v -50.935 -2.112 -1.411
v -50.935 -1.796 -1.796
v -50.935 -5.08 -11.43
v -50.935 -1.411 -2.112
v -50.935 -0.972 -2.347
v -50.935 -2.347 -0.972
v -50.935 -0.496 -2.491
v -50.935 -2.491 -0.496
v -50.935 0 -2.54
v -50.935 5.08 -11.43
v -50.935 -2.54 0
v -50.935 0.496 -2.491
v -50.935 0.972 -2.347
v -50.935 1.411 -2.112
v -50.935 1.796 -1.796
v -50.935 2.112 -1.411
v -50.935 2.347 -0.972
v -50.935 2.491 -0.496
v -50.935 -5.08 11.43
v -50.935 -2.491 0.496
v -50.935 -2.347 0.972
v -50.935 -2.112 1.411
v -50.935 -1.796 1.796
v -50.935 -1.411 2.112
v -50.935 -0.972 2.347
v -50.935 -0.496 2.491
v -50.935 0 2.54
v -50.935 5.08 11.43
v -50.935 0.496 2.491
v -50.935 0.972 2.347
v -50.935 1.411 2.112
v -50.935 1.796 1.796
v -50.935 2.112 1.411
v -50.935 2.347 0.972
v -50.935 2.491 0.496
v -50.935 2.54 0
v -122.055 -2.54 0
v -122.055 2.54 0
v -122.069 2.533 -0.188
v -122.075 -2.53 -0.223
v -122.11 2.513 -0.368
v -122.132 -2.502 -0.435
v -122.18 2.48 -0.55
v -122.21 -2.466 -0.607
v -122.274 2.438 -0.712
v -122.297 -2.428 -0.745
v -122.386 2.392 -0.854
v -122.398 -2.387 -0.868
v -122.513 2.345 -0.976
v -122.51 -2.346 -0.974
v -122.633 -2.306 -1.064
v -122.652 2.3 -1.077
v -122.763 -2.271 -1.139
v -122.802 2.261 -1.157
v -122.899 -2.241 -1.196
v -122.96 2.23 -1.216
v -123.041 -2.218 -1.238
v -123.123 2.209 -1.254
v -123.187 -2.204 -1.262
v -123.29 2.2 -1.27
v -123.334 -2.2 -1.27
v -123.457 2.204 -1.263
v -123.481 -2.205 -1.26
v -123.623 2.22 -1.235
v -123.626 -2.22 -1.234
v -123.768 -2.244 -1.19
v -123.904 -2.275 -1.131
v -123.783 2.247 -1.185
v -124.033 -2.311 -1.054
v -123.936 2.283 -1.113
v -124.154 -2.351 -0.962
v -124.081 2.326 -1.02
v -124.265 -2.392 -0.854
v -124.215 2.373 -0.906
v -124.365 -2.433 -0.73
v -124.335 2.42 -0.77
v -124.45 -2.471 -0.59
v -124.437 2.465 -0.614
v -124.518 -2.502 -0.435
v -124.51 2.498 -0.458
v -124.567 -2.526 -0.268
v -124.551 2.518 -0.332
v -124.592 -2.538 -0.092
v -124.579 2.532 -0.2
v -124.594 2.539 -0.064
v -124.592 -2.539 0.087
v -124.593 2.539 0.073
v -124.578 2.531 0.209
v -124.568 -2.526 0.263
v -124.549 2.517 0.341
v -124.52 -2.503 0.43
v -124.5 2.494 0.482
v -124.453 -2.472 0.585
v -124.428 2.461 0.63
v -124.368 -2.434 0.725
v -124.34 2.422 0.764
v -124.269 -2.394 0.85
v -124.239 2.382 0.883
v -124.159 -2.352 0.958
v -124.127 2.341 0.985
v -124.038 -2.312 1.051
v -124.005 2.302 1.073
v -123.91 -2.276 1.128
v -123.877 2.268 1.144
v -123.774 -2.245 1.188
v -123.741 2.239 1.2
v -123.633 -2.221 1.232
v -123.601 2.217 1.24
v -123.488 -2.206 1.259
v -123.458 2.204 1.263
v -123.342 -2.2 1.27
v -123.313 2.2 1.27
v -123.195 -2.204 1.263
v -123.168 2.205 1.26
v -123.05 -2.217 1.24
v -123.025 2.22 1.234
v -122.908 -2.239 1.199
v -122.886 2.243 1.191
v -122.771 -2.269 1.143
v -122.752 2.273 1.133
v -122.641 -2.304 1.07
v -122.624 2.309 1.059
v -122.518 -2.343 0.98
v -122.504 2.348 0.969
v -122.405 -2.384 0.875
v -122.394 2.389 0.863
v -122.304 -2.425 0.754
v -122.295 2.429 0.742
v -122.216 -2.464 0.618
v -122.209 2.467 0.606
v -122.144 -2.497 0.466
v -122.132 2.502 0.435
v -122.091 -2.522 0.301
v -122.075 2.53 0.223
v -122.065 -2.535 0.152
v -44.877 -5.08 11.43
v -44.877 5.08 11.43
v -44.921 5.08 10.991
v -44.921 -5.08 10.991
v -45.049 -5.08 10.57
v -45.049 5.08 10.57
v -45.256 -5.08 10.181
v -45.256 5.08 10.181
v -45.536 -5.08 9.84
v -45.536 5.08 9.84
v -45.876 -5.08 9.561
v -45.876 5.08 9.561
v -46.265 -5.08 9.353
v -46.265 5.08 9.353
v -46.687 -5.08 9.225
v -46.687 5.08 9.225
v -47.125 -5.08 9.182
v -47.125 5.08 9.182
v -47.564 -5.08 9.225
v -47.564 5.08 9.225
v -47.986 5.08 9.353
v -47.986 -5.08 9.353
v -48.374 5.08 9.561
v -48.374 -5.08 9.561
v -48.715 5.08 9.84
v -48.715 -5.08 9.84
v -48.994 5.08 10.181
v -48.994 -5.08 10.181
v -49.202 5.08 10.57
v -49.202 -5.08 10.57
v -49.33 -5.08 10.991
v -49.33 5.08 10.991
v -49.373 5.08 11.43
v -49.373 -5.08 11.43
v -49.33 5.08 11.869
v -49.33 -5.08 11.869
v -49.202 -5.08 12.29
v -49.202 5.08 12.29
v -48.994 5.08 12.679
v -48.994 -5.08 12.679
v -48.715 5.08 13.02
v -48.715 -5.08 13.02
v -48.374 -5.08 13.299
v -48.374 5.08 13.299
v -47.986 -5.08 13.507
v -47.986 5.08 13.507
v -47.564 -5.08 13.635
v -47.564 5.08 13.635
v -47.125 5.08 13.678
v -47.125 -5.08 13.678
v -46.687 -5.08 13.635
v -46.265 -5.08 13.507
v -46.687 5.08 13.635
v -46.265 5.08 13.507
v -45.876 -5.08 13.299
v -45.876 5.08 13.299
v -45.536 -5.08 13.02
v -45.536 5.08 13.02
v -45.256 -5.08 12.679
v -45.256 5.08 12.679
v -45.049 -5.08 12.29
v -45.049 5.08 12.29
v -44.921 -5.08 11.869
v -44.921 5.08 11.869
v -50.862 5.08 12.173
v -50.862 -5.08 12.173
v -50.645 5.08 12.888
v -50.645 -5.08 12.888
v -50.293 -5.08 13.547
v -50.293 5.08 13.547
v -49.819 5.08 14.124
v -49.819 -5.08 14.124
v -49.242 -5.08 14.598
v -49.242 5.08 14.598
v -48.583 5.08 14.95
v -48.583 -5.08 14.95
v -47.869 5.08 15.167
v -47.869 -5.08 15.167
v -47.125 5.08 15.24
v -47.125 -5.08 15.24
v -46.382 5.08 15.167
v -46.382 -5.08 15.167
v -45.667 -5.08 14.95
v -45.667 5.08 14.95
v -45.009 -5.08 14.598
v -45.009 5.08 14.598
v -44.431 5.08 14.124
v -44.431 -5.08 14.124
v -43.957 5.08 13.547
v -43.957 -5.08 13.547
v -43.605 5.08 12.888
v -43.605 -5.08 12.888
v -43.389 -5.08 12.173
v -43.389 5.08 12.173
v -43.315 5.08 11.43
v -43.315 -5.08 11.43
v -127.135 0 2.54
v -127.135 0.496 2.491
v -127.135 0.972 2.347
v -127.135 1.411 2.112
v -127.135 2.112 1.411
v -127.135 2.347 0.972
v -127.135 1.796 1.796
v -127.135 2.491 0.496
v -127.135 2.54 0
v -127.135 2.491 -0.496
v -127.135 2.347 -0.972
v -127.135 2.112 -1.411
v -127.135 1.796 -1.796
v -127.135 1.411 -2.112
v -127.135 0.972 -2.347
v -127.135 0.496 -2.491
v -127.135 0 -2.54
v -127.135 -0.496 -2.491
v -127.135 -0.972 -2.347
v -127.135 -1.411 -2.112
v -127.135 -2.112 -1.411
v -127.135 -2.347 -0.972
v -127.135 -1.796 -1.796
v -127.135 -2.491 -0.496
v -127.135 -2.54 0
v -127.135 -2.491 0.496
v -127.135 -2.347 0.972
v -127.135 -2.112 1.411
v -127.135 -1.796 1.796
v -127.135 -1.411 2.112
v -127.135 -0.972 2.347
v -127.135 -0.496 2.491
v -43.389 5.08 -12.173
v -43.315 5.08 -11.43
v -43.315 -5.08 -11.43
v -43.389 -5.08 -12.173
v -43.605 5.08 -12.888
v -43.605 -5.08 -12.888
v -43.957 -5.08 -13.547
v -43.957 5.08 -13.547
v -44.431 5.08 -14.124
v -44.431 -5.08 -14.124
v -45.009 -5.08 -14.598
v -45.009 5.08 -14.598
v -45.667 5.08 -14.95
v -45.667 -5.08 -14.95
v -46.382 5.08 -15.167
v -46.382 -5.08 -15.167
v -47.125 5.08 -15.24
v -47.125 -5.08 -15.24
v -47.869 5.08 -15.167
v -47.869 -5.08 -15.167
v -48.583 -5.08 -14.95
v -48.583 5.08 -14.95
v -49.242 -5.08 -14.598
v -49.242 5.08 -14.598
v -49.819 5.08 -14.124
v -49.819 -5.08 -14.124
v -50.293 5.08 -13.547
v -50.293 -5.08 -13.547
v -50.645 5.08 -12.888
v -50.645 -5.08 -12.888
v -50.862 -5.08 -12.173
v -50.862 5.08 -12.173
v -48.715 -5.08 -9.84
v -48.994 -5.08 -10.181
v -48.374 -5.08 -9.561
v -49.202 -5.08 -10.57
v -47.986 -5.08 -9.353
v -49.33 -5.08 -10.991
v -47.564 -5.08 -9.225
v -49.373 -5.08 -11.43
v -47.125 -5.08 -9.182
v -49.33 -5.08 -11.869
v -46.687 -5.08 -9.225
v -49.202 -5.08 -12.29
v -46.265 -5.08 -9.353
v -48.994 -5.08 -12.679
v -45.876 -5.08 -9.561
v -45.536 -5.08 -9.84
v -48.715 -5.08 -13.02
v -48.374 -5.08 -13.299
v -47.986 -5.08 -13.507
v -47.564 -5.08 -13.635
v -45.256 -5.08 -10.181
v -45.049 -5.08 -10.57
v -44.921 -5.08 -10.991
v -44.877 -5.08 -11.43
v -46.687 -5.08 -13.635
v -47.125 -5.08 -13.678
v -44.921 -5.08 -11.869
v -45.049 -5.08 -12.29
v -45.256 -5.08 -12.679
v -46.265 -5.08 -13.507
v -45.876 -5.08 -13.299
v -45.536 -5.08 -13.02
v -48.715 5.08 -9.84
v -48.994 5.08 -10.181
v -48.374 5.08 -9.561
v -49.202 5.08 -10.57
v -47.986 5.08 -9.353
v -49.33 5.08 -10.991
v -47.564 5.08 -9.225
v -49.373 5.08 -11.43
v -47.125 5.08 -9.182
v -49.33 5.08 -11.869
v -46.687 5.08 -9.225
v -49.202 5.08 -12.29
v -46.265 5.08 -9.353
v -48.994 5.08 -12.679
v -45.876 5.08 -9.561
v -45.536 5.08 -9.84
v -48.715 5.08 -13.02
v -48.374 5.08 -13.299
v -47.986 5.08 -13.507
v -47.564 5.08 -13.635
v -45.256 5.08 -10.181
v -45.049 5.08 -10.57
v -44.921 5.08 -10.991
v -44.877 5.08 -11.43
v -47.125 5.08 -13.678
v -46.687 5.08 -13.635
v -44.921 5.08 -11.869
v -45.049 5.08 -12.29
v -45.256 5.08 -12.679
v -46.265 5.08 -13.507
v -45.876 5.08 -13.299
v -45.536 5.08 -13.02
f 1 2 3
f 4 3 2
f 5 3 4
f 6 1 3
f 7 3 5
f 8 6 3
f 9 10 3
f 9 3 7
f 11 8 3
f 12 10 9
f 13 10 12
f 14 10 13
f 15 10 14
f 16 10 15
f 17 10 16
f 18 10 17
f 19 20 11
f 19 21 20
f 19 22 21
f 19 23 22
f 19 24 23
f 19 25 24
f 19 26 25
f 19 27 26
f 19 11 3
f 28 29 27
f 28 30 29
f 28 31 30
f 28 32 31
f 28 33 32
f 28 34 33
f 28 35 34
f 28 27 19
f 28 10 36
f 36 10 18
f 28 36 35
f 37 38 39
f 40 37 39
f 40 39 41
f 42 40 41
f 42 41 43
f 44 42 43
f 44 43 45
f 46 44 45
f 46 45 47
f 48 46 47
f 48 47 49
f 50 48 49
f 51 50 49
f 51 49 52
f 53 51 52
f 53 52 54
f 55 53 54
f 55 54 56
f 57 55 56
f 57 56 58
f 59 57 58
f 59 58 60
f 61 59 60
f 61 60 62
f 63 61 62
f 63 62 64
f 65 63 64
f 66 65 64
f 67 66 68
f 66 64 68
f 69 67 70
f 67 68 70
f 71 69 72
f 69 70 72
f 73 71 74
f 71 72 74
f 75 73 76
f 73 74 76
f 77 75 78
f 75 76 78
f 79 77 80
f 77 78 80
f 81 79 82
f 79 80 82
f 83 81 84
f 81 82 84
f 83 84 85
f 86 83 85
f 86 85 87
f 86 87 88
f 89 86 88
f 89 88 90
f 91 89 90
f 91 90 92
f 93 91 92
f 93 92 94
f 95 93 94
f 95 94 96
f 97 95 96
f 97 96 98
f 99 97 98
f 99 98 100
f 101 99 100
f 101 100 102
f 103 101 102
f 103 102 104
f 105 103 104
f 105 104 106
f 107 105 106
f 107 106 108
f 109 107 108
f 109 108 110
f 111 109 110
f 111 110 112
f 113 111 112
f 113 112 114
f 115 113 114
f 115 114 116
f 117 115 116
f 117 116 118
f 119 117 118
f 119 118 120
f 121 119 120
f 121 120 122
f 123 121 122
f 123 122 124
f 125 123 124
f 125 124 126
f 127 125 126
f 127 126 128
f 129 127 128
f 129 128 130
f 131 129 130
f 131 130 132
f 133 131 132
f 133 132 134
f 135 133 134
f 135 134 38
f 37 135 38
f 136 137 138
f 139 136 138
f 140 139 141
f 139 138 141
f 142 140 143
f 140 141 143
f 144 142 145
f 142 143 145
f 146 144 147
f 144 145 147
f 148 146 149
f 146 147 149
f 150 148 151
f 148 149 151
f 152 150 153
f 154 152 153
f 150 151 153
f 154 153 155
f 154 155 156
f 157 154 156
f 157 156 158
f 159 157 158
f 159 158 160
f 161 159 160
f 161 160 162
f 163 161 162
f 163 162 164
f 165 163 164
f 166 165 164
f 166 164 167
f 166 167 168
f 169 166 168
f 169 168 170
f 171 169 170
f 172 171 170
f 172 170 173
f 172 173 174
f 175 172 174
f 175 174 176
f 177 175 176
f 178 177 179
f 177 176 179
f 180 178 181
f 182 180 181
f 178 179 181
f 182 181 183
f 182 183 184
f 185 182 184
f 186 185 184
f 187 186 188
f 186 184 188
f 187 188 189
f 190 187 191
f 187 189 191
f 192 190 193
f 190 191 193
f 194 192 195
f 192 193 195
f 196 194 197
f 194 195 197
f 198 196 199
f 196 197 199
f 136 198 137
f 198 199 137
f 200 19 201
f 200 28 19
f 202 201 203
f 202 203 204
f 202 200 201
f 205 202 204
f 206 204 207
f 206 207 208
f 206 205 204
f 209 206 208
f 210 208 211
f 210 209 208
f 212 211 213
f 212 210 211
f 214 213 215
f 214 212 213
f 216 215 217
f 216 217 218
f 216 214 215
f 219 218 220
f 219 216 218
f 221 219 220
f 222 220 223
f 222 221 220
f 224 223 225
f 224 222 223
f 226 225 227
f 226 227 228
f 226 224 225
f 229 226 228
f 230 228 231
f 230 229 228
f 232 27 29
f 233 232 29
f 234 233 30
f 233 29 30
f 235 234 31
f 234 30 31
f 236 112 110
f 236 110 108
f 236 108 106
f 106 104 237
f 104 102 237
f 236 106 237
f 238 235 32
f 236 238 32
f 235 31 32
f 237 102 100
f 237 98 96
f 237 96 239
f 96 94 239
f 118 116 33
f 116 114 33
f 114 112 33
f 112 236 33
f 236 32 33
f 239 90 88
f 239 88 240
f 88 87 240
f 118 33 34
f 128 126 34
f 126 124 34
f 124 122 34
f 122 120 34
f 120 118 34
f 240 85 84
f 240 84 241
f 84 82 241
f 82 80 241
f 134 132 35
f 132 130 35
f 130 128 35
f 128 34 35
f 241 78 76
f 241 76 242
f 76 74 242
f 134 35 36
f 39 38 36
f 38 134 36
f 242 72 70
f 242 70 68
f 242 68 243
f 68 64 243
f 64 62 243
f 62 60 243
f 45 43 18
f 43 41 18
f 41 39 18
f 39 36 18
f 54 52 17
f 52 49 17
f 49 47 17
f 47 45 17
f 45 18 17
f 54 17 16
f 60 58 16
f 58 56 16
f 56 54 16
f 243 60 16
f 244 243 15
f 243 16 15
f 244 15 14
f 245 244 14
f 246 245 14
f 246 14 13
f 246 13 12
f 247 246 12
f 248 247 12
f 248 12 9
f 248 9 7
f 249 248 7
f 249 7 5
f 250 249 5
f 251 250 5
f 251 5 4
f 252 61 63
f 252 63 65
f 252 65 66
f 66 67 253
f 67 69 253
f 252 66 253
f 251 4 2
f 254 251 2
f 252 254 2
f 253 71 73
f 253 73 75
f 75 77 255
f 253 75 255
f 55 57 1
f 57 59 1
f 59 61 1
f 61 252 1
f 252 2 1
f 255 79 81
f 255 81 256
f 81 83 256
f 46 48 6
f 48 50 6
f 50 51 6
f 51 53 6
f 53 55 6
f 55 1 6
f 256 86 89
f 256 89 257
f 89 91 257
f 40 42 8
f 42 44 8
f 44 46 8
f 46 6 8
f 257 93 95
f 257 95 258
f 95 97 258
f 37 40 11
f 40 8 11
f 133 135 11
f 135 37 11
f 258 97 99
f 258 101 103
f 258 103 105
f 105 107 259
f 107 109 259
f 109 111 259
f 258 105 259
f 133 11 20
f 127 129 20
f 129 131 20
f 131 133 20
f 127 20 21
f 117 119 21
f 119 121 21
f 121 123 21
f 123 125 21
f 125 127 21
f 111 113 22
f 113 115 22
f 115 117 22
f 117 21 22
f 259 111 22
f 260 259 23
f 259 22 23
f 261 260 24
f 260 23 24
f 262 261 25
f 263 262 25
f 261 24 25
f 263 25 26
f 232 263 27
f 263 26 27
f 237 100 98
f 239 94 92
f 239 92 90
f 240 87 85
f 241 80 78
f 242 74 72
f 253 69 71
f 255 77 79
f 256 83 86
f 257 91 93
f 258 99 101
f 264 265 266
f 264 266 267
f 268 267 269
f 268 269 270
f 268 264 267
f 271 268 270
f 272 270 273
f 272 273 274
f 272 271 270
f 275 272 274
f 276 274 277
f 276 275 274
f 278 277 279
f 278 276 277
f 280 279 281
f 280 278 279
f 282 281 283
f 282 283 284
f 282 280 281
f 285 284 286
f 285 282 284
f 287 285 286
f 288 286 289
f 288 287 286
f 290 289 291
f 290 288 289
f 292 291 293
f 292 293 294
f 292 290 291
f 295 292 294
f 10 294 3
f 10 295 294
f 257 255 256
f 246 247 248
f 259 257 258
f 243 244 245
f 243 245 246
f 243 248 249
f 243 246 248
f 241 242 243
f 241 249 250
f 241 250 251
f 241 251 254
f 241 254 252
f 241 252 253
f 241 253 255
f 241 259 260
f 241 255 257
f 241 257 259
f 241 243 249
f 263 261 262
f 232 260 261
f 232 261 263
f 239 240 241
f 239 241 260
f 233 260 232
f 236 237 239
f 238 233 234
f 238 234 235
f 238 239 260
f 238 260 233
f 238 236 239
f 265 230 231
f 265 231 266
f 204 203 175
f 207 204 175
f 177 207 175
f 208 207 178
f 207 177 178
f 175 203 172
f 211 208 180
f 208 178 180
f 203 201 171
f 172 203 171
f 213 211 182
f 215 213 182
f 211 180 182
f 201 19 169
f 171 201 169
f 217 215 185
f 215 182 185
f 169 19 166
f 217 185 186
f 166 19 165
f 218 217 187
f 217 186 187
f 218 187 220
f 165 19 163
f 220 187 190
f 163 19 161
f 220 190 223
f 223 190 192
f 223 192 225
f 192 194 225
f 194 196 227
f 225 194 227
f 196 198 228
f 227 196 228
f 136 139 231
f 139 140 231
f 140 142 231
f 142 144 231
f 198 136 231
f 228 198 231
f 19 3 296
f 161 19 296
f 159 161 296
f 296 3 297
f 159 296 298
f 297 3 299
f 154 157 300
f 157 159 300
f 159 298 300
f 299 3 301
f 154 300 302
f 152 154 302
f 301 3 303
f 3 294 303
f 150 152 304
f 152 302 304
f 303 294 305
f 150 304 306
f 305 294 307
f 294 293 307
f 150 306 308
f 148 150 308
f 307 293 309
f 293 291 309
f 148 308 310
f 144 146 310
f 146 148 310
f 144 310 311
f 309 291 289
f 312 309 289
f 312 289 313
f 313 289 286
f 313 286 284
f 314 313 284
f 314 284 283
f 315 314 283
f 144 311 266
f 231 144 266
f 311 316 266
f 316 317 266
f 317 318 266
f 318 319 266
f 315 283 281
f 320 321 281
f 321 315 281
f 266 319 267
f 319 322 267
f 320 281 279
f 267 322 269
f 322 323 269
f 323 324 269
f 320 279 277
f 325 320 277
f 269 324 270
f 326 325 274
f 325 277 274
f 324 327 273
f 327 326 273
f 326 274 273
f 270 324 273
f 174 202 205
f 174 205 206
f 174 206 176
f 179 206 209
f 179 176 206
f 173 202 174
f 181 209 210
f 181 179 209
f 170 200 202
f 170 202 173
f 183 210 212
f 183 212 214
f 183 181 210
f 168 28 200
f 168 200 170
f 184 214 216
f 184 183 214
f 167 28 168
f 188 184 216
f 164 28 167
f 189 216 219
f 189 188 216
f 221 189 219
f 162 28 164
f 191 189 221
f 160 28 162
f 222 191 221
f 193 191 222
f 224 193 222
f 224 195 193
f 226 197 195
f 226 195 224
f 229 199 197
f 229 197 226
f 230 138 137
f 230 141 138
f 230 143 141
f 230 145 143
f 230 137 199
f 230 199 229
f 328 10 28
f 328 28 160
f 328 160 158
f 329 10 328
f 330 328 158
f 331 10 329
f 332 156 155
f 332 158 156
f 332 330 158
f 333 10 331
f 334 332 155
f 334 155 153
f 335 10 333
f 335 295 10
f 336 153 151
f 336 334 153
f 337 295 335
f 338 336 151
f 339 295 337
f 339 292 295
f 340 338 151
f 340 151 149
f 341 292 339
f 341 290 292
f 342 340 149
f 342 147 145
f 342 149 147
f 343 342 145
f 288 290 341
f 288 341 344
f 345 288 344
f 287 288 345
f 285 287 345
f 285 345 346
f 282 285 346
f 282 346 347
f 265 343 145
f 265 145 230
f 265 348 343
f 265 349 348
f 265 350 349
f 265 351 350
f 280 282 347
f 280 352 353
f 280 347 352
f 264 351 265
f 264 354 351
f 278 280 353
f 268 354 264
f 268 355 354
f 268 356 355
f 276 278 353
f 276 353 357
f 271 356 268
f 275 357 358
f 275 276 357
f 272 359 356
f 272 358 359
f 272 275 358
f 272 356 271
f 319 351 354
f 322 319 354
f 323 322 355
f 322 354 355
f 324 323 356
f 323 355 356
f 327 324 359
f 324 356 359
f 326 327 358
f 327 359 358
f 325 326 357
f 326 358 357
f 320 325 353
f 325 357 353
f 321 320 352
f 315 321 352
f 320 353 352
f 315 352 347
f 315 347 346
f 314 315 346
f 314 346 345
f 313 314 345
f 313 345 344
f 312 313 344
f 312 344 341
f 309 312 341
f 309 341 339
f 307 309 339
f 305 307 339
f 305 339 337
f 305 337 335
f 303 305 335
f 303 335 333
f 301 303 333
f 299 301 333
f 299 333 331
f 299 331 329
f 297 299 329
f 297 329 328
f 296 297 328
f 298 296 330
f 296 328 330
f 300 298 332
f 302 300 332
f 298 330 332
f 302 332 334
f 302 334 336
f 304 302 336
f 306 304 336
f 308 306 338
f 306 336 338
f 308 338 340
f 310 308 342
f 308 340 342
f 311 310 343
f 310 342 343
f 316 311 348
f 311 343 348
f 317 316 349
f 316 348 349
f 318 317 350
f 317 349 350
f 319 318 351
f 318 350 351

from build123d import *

# Parameters (mm, degrees)
BOSS_EXTRUDE1_DEPTH = 5.08
CUT_EXTRUDE1_REACH  = 12.16
SKETCH4_R           = 2.2479
SKETCH5_R           = 2.54
BOSS_EXTRUDE2_DEPTH = 76.2
CUT_EXTRUDE5_REACH  = 9.62
SKETCH6_R           = 1.27


with BuildPart() as part:
    # Sketch2 → Boss-Extrude1 (new body, symmetric)
    with BuildSketch(Plane(origin=(0, 0, 0), x_dir=(1, 0, 0), z_dir=(0, 1, 0))):
        with BuildLine():
            Line((-50.935337995, 2.421627074), (-50.935337995, -2.138056527))
            Line((-50.935337995, -2.138056527), (-50.935337995, -11.43))
            ThreePointArc((-50.935337995, -11.43), (-47.125337995, -15.24), (-43.315337995, -11.43))
            Line((-43.315337995, -11.43), (-43.315337995, 11.43))
            ThreePointArc((-43.315337995, 11.43), (-47.125337995, 15.24), (-50.935337995, 11.43))
            Line((-50.935337995, 11.43), (-50.935337995, 2.421627074))
        make_face()
    extrude(amount=BOSS_EXTRUDE1_DEPTH, both=True)

    # Sketch4 → Cut-Extrude1 (cut, up to next)
    with BuildSketch(Plane(origin=(0, 5.08, 0), x_dir=(1, 0, 0), z_dir=(0, 1, 0)), mode=Mode.PRIVATE) as cut_extrude1_sk1:
        with Locations((-47.125337995, 11.43)):
            Circle(SKETCH4_R)
    cut_extrude1_tool1 = extrude(cut_extrude1_sk1.sketch, amount=-CUT_EXTRUDE1_REACH, mode=Mode.PRIVATE) & part.part
    add(cut_extrude1_tool1.solids().sort_by_distance((-47.125338, 5.08, -11.43))[0], mode=Mode.SUBTRACT)
    # Sketch4 → Cut-Extrude1 (cut, up to next)
    with BuildSketch(Plane(origin=(0, 5.08, 0), x_dir=(1, 0, 0), z_dir=(0, 1, 0)), mode=Mode.PRIVATE) as cut_extrude1_sk2:
        with Locations((-47.125337995, -11.43)):
            Circle(SKETCH4_R)
    cut_extrude1_tool2 = extrude(cut_extrude1_sk2.sketch, amount=-CUT_EXTRUDE1_REACH, mode=Mode.PRIVATE) & part.part
    add(cut_extrude1_tool2.solids().sort_by_distance((-47.125338, 5.08, 11.43))[0], mode=Mode.SUBTRACT)

    # Sketch5 → Boss-Extrude2 (add)
    with BuildSketch(Plane.ZY.offset(50.935337995)):
        Circle(SKETCH5_R)
    extrude(amount=BOSS_EXTRUDE2_DEPTH)

    # Sketch6 → Cut-Extrude5 (cut, up to next)
    with BuildSketch(Plane(origin=(0, 2.54, 0), x_dir=(1, 0, 0), z_dir=(0, 1, 0)), mode=Mode.PRIVATE) as cut_extrude5_sk1:
        with Locations((-123.325337995, 0)):
            Circle(SKETCH6_R)
    cut_extrude5_tool1 = extrude(cut_extrude5_sk1.sketch, amount=-CUT_EXTRUDE5_REACH, mode=Mode.PRIVATE) & part.part
    add(cut_extrude5_tool1.solids().sort_by_distance((-123.325338, 2.54, 0))[0], mode=Mode.SUBTRACT)


solid = part.part
